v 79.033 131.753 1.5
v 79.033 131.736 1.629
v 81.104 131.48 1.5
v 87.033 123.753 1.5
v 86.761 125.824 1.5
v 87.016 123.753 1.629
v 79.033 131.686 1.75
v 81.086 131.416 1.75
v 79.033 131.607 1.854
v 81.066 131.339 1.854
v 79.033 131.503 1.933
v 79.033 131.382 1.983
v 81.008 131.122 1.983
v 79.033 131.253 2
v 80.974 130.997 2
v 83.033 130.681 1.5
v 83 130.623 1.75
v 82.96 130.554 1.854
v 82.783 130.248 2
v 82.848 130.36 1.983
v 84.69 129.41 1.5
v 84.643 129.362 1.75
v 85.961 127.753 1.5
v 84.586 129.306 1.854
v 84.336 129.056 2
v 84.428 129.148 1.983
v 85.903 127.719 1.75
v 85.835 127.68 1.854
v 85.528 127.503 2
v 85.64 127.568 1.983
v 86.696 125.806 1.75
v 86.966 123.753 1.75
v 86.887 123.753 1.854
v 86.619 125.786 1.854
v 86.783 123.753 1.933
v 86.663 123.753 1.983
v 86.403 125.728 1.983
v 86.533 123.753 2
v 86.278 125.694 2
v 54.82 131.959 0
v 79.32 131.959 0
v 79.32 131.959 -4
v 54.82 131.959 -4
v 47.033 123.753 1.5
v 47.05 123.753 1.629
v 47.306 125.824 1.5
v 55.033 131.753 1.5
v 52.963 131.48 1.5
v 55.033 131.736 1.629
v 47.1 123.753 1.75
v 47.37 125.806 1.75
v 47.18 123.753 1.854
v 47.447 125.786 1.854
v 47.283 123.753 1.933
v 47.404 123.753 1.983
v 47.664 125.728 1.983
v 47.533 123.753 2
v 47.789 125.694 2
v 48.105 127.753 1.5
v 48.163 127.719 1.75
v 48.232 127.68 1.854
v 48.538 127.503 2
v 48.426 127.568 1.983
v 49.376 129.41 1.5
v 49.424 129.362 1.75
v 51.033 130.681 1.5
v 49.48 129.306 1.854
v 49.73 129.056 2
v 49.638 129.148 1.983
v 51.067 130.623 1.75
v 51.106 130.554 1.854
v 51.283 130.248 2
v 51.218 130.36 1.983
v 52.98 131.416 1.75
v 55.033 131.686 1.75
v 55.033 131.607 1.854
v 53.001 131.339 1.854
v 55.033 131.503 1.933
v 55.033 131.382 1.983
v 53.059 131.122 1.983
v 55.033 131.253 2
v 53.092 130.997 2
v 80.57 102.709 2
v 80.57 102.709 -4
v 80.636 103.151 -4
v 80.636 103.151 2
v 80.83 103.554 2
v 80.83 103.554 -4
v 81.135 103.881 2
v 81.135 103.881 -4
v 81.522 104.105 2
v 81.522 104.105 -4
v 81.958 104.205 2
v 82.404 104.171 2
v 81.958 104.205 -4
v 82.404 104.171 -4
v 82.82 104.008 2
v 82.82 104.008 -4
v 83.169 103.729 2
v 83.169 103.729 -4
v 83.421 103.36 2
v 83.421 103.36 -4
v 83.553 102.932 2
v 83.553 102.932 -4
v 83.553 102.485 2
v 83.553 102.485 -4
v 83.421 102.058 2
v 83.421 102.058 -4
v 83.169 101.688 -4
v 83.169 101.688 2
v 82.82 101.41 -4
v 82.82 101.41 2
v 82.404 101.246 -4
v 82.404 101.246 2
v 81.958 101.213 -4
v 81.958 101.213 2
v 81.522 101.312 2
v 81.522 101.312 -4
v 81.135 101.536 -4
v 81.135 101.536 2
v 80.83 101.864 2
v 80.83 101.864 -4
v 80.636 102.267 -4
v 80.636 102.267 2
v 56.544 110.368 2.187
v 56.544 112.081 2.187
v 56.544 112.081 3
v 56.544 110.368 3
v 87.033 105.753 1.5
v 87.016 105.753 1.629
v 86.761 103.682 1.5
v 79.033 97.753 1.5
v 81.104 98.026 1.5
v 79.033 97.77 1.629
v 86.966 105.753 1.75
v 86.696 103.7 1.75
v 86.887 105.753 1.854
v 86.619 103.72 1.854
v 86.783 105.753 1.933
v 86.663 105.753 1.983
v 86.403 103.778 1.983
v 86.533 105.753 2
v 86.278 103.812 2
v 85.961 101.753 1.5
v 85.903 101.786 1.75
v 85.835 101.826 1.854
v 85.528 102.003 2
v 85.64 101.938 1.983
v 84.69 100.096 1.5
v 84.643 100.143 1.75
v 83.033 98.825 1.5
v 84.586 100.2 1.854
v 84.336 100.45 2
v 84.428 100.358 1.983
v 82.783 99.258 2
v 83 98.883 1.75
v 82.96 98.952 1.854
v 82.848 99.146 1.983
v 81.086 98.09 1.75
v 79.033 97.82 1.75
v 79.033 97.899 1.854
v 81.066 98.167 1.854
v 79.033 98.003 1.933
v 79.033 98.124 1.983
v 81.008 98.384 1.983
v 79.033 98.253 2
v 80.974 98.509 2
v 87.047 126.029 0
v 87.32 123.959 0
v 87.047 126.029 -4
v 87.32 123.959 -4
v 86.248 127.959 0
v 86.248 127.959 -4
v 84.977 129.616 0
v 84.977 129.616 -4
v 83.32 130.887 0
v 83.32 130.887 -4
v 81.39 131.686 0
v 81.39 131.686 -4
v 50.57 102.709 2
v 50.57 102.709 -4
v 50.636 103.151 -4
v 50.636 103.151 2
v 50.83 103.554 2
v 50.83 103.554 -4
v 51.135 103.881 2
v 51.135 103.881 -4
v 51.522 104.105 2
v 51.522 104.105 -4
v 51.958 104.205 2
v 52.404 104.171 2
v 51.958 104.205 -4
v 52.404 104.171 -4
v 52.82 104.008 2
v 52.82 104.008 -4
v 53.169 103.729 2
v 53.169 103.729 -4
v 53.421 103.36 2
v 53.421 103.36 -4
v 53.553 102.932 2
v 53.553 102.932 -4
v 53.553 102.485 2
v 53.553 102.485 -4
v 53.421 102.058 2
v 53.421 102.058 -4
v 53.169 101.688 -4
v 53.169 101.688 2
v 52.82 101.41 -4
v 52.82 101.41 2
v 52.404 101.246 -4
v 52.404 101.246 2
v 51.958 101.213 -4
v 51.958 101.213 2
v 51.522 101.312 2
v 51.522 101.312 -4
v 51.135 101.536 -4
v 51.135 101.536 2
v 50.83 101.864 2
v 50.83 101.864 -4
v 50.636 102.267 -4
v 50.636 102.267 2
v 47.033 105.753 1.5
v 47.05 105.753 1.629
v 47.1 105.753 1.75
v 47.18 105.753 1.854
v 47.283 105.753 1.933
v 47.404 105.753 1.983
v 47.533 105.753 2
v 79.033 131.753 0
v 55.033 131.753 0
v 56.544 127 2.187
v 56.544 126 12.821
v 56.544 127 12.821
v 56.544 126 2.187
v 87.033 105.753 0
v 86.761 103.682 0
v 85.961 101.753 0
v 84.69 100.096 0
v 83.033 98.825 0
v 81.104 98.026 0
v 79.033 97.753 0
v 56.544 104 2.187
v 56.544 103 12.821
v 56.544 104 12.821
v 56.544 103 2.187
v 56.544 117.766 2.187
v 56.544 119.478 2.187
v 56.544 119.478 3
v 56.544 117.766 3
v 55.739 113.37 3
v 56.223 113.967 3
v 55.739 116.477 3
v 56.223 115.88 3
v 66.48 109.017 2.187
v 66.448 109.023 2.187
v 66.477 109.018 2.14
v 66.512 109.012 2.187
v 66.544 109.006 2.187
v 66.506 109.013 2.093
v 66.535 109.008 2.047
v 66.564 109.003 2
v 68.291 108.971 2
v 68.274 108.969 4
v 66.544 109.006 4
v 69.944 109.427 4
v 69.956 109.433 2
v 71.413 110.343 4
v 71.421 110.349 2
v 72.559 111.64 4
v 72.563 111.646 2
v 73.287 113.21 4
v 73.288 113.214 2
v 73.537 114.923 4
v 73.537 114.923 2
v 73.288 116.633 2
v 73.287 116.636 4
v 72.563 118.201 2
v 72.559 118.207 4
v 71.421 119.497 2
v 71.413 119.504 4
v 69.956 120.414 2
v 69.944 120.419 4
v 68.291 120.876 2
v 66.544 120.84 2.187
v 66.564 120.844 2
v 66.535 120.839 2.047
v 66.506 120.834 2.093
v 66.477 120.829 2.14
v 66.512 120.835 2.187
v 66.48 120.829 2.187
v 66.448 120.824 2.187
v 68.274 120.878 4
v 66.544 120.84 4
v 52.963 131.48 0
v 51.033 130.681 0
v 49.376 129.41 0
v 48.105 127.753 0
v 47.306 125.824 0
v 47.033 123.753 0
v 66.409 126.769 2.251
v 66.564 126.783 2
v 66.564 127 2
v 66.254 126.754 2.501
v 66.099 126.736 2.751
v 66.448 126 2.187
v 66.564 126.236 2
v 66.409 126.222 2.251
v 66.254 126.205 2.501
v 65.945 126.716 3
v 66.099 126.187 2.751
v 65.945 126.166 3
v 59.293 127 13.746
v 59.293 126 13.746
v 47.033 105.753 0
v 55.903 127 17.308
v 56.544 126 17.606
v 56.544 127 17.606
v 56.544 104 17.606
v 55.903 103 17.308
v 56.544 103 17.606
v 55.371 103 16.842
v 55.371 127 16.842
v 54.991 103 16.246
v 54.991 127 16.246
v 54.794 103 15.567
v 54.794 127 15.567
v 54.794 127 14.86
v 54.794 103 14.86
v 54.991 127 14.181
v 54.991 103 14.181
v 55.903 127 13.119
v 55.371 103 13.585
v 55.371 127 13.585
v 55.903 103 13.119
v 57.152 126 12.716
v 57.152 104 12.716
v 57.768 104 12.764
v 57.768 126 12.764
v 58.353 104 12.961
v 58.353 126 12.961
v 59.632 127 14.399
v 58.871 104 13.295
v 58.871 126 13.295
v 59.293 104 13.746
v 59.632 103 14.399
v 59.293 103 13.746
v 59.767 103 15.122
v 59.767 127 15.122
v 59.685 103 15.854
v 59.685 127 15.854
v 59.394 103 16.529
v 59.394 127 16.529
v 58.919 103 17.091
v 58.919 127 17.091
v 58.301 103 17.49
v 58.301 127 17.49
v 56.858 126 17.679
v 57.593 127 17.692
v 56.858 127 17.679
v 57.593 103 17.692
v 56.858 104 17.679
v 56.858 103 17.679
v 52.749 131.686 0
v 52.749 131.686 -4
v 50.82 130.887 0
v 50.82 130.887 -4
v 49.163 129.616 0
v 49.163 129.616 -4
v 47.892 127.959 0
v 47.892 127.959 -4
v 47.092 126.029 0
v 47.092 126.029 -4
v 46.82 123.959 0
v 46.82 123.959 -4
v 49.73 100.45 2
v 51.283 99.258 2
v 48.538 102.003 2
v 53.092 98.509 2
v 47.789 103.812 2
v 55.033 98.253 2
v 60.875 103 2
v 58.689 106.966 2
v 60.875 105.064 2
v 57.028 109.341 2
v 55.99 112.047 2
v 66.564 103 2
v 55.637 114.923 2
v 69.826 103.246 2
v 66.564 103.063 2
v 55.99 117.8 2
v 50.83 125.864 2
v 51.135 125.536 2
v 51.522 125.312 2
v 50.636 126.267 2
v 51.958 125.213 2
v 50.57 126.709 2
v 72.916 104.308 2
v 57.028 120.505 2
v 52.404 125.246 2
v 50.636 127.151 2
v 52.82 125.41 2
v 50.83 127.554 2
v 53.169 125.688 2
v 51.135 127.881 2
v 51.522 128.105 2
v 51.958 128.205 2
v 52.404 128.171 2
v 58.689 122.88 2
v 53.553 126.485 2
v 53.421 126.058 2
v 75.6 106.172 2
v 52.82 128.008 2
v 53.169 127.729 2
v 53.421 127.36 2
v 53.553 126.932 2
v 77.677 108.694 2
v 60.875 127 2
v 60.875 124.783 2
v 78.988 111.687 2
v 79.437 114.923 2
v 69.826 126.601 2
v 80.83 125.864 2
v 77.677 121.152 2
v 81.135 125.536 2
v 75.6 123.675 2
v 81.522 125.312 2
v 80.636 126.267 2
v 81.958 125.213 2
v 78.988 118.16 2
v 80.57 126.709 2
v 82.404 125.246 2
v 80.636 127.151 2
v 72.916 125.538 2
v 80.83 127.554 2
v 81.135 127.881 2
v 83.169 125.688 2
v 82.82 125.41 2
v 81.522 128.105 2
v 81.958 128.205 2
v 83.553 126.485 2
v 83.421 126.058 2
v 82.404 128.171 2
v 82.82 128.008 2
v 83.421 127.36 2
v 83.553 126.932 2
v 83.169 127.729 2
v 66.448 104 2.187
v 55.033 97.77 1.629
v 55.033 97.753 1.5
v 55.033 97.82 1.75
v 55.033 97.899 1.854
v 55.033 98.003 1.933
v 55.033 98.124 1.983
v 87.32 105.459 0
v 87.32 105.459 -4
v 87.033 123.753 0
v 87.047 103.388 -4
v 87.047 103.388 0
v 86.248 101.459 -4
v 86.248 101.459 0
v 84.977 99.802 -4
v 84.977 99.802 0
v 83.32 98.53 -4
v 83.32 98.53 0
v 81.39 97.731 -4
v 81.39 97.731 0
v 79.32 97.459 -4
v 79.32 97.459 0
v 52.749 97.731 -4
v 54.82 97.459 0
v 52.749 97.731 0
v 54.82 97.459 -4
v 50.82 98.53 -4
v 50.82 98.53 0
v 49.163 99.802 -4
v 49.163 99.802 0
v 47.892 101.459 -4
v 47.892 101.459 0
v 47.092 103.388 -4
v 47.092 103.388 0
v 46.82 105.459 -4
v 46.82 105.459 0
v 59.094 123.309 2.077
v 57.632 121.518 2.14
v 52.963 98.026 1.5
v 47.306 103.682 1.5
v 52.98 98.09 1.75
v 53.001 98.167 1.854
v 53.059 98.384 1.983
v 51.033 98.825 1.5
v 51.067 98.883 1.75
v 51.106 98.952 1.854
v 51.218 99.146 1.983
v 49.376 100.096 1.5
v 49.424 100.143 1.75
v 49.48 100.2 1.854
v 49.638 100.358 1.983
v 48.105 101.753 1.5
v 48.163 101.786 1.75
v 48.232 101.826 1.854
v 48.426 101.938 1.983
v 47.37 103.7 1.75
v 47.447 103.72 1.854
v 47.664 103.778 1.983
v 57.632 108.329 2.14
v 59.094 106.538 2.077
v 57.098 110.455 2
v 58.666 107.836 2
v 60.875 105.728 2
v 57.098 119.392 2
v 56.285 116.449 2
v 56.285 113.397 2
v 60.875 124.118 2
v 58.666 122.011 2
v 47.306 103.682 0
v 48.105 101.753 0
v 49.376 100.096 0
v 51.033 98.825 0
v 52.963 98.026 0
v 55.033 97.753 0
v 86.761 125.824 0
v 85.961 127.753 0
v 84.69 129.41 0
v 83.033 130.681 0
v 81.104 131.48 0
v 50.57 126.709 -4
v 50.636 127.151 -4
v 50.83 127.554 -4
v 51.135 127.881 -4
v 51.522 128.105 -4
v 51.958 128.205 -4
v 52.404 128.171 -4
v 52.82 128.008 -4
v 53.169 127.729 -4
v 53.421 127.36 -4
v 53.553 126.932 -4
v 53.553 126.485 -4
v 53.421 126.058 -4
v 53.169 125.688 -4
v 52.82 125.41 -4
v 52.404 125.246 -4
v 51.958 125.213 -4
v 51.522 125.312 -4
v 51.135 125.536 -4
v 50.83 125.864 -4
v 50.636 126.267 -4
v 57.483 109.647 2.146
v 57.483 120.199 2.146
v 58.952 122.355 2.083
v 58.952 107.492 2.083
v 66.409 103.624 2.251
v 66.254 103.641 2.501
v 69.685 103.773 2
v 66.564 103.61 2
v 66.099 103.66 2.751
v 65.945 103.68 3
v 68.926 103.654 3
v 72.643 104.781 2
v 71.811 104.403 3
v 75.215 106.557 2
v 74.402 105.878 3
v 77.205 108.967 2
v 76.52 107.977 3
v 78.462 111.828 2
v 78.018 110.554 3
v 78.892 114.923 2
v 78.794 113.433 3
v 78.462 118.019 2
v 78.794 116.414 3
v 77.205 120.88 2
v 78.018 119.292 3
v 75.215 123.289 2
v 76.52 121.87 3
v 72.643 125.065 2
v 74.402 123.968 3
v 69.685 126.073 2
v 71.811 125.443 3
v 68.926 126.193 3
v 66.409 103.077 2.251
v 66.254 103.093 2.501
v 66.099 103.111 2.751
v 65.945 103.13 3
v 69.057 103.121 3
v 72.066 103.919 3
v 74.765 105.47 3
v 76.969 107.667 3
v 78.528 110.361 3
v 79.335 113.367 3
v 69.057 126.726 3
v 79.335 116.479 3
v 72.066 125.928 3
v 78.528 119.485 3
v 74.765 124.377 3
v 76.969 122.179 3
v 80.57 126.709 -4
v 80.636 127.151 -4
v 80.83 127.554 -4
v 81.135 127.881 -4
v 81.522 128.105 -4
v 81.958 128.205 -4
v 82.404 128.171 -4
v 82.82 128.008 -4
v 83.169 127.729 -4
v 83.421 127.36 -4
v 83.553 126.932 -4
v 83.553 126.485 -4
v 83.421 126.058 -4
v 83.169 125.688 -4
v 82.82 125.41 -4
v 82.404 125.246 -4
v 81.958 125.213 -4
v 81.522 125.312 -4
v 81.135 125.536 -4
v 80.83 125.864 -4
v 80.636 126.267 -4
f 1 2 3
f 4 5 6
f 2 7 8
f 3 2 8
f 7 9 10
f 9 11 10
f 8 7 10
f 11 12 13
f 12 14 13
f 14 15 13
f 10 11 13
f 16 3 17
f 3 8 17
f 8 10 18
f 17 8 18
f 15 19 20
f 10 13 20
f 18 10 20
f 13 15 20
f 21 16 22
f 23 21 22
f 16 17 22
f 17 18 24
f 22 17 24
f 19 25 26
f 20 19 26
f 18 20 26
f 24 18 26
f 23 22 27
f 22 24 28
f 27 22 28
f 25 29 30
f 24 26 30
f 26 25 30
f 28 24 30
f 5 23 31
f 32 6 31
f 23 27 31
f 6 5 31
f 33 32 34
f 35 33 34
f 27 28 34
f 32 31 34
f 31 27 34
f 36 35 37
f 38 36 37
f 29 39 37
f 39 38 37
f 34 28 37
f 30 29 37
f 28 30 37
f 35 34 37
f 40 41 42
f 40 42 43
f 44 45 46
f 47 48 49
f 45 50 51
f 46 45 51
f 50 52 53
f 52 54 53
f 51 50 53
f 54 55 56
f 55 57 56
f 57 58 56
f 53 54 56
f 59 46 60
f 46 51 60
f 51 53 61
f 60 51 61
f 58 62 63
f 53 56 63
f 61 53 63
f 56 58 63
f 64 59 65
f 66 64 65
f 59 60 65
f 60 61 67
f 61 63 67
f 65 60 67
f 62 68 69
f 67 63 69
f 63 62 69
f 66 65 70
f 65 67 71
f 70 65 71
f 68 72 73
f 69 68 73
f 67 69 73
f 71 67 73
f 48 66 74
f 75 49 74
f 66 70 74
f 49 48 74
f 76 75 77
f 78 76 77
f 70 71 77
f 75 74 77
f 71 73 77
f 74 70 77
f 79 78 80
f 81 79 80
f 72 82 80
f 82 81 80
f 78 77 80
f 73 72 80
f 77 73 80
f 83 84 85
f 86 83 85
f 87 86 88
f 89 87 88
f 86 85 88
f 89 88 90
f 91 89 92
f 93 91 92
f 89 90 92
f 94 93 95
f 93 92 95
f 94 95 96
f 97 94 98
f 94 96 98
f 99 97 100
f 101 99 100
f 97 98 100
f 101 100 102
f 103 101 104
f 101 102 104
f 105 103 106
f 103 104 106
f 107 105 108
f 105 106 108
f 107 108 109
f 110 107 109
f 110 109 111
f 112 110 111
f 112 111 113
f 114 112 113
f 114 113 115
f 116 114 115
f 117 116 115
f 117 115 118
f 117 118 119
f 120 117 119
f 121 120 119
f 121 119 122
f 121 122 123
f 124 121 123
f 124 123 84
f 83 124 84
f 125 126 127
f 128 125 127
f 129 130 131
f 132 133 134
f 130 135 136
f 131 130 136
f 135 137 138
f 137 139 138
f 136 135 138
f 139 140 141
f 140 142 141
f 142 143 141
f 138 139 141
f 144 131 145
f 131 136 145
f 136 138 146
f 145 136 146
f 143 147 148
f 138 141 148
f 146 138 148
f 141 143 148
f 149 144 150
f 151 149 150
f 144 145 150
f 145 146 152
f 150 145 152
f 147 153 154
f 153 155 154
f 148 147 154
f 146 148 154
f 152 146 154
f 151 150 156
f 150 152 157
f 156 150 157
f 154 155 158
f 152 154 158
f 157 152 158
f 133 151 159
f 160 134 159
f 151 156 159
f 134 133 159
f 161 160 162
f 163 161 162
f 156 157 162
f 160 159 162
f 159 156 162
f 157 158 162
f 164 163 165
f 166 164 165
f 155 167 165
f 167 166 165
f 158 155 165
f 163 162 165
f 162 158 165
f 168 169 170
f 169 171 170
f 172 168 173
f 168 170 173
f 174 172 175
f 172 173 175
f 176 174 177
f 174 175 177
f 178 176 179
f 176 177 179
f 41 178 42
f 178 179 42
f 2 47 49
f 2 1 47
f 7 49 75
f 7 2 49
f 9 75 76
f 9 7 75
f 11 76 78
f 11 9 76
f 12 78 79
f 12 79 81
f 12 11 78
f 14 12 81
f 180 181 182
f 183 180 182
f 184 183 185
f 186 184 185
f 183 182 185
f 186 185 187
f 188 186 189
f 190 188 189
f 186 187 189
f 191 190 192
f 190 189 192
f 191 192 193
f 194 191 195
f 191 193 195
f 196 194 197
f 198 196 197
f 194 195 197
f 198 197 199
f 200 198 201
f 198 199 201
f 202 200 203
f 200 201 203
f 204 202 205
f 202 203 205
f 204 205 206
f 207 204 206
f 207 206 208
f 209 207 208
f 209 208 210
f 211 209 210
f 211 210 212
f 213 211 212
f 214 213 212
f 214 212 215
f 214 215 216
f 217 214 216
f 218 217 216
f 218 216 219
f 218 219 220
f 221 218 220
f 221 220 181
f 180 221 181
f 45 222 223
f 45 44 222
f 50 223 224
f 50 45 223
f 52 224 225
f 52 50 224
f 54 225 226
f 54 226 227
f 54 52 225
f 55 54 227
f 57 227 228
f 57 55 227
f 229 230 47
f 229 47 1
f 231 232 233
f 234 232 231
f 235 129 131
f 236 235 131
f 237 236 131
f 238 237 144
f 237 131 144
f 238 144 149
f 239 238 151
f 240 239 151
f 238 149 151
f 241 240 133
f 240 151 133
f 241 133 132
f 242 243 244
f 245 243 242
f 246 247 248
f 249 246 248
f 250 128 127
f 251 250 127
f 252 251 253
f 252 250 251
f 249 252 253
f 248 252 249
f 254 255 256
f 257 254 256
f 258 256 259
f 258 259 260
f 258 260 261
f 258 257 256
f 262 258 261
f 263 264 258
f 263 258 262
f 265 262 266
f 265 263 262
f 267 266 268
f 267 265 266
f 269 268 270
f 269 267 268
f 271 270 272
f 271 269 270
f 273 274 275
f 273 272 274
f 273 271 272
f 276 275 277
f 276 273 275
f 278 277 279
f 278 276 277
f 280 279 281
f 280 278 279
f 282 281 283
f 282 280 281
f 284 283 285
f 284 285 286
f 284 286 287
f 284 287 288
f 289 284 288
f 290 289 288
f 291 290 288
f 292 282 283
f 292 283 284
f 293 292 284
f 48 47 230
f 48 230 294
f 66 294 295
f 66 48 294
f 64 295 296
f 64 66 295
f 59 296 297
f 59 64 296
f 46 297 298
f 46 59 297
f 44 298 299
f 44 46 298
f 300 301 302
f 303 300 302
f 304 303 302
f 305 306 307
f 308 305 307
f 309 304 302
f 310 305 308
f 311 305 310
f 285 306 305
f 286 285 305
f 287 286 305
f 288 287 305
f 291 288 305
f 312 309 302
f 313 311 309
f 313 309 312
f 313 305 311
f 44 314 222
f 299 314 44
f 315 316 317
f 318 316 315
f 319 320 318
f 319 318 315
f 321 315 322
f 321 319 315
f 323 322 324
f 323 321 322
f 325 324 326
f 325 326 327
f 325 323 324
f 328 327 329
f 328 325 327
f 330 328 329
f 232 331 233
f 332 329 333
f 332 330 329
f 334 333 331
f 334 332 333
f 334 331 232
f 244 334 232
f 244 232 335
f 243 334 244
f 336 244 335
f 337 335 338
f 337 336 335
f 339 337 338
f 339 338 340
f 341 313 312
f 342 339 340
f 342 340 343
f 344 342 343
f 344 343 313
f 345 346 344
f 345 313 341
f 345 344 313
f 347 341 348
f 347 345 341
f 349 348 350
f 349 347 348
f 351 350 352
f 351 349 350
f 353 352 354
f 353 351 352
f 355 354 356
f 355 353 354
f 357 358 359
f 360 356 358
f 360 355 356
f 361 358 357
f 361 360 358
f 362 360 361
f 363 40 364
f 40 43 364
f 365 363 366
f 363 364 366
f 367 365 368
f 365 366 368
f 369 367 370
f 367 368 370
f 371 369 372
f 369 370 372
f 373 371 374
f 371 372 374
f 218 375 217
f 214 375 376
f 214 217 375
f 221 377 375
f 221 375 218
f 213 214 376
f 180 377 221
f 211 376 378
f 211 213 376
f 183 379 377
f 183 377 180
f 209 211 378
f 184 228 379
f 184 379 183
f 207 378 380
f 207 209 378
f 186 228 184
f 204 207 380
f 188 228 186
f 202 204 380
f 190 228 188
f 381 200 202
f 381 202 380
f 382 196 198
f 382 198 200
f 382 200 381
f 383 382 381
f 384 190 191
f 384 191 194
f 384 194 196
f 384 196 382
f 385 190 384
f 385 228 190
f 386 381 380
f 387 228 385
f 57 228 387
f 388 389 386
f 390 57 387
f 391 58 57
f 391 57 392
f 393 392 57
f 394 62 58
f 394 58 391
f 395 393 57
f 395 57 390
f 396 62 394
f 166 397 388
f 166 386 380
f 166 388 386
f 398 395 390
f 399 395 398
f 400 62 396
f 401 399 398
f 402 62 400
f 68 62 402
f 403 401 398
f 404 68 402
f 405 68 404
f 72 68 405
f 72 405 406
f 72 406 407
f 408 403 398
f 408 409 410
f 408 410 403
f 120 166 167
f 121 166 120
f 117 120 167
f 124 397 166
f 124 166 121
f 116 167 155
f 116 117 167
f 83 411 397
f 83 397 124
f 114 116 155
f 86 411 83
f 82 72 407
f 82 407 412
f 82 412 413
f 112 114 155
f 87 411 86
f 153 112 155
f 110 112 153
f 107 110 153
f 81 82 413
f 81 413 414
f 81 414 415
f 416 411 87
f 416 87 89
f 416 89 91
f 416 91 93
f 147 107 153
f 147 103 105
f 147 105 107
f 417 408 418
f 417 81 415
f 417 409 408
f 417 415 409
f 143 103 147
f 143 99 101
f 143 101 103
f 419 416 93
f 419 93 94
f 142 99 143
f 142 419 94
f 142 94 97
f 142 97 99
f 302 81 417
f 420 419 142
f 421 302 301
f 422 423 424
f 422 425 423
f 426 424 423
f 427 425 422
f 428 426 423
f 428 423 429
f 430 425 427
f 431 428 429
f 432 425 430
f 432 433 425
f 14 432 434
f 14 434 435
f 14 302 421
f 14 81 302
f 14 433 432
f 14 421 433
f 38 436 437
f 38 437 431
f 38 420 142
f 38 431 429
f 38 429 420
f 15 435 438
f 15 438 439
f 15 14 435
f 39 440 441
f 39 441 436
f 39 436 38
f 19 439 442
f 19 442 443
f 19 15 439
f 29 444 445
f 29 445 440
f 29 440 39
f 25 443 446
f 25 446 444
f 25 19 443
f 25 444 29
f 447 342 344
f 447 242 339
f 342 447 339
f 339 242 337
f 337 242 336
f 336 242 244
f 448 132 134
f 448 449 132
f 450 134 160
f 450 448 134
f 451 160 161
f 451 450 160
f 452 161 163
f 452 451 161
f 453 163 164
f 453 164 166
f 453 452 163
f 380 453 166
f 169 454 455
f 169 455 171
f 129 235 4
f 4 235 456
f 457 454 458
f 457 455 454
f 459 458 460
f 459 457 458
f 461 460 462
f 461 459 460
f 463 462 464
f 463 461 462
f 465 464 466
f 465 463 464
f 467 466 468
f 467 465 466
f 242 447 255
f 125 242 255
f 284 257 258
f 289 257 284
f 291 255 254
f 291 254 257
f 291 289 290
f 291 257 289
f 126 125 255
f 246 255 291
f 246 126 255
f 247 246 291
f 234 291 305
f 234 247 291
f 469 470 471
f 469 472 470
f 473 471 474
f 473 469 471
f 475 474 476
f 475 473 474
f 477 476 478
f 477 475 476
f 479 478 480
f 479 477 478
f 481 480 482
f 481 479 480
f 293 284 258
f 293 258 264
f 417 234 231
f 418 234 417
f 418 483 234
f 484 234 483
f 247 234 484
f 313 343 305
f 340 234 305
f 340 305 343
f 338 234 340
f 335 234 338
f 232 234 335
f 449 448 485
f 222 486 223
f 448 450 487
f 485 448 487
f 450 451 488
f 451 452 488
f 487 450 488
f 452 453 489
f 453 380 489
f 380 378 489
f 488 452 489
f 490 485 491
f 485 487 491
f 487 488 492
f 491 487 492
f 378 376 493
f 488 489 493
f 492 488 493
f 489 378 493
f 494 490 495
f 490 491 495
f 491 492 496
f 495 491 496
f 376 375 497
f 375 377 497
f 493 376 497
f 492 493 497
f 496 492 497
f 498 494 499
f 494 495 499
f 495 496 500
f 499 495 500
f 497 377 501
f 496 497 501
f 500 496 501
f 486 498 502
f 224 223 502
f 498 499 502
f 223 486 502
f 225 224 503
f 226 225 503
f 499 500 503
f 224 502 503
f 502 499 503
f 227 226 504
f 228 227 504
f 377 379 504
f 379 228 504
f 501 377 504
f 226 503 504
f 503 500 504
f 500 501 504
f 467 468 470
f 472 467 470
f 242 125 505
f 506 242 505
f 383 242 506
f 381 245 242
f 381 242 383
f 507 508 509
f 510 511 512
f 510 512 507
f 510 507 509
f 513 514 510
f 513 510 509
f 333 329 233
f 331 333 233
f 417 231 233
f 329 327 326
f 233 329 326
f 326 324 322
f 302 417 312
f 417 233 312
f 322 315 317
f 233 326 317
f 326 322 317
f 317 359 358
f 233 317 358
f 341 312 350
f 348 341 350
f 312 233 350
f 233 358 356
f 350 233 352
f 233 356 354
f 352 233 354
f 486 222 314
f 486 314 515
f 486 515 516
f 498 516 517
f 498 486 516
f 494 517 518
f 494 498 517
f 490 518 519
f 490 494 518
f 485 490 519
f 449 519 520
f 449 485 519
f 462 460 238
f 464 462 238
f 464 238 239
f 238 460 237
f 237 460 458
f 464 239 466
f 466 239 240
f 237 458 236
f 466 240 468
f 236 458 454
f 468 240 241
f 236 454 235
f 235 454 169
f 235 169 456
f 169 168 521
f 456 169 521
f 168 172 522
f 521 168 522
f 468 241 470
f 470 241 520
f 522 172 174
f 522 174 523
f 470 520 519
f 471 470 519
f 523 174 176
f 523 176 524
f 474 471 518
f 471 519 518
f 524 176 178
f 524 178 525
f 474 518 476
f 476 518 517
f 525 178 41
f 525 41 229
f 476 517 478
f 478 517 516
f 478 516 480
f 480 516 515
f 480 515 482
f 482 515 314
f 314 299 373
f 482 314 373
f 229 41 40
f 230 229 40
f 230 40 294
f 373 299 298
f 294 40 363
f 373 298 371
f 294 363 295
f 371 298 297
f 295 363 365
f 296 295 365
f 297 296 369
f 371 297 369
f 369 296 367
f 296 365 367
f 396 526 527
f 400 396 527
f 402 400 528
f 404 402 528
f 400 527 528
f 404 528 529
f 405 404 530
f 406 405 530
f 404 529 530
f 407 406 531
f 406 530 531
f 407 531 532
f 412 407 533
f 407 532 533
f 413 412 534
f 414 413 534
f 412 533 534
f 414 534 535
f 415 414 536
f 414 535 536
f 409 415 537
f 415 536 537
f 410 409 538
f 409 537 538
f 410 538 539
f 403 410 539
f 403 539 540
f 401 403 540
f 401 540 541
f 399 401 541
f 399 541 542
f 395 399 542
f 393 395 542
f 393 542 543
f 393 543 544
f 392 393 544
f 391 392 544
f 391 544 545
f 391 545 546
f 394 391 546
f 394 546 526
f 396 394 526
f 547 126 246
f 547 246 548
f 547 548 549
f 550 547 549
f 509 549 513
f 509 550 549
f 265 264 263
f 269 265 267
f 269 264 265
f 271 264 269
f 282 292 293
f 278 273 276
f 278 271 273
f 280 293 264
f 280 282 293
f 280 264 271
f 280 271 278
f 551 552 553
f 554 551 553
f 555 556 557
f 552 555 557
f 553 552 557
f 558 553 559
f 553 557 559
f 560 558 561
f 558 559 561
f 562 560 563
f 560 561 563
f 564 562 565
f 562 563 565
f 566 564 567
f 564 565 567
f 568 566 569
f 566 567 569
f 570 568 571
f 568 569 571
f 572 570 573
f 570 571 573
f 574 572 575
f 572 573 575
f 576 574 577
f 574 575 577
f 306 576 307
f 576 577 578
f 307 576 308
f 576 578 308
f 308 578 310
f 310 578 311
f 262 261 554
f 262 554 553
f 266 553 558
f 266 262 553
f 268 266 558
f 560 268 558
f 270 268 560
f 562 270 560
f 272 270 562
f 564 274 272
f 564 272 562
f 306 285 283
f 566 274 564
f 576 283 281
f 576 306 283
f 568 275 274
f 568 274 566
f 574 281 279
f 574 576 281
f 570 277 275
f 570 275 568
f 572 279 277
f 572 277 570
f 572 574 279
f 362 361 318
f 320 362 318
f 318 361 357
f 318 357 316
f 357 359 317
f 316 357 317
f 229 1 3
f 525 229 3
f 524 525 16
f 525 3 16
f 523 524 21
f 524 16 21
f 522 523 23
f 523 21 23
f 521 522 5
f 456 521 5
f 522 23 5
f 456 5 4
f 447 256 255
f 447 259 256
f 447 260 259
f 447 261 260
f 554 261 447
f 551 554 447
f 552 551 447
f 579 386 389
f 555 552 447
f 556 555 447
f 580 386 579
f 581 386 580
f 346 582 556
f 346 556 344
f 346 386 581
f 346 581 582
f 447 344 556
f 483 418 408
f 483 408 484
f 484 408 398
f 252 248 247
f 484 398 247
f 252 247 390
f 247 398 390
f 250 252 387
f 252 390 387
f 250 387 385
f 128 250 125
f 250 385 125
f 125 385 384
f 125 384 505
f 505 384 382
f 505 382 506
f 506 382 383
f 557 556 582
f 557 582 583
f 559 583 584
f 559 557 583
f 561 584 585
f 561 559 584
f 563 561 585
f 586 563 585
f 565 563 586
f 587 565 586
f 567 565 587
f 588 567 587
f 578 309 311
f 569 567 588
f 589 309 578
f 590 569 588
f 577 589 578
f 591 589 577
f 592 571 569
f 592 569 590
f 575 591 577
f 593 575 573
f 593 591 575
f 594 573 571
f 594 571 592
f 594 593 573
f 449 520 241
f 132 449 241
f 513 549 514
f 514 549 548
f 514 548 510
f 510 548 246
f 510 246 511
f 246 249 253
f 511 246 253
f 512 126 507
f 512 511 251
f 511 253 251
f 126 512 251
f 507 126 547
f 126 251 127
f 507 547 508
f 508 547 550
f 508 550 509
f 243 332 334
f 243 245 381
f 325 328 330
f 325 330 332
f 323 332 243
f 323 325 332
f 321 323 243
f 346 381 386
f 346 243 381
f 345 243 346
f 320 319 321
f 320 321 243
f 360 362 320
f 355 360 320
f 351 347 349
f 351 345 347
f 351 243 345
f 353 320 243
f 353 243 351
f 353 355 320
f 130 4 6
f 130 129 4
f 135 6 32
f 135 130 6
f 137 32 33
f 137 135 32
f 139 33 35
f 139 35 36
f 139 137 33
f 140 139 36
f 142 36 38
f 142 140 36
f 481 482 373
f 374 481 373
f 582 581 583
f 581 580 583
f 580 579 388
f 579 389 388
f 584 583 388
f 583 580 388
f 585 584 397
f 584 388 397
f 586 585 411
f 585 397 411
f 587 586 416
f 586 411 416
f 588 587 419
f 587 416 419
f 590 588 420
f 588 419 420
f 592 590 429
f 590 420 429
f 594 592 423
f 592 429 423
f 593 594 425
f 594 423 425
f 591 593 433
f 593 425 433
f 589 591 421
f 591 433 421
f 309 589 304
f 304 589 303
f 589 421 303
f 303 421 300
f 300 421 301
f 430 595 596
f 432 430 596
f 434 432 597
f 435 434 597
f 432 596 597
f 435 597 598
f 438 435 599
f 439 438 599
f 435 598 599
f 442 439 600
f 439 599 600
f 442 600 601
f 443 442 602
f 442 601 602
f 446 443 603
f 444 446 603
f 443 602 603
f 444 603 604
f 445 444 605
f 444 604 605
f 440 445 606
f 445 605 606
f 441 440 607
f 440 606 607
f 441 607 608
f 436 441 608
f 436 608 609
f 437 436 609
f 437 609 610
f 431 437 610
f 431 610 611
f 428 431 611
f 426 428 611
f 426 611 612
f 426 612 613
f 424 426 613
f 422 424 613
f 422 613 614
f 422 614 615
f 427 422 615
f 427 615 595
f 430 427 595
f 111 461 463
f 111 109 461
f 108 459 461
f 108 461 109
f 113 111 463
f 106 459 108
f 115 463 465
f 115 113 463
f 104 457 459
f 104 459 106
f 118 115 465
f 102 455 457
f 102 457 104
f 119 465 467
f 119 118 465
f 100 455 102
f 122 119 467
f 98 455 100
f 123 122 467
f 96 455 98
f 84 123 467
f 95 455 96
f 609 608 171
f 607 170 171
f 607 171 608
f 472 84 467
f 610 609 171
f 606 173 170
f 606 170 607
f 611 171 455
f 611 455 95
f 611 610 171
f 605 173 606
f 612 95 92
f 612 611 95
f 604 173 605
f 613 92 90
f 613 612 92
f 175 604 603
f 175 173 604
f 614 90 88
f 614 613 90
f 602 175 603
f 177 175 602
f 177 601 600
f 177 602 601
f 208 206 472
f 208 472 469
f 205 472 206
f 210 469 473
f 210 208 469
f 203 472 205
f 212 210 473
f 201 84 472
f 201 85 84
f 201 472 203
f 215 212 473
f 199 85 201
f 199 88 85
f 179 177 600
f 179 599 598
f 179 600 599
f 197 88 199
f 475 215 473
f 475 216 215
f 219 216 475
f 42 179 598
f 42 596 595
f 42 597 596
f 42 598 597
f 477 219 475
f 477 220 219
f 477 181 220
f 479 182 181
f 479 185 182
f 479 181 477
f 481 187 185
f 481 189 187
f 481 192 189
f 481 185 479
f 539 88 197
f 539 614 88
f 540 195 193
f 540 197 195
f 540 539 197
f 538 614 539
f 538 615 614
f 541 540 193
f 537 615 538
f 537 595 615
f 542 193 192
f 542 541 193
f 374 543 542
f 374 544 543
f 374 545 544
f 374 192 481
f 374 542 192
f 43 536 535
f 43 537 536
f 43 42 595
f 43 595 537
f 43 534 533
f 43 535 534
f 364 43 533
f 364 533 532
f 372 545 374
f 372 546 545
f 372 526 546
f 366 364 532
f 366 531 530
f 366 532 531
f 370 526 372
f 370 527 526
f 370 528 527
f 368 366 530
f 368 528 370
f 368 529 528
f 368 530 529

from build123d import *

# Parameters (mm, degrees)
SKETCH3_W            = 40
SKETCH3_H            = 34
SKETCH3_R            = 0.25
SKETCH3_R_2          = 0.5
BOSS_EXTRUDE2_DEPTH  = 2
SKETCH4_R            = 6
BOSS_EXTRUDE3_DEPTH  = 2
SKETCH5_R            = 11.899793619
BOSS_EXTRUDE4_DEPTH  = 1
SKETCH7_R            = 11.354972543
SKETCH7_R_2          = 6
CUT_EXTRUDE1_DEPTH   = 2
BOSS_EXTRUDE5_DEPTH  = 24
SKETCH11_W           = 16
SKETCH11_H           = 22
CUT_EXTRUDE2_DEPTH   = 10
SKETCH12_R           = 2.5
BOSS_EXTRUDE6_DEPTH  = 24
CUT_EXTRUDE3_DEPTH   = 26
FILLET3_R            = 8
FILLET4_R            = 8
FILLET5_R            = 8
FILLET6_R            = 8
SKETCH16_W           = 40.5
SKETCH16_H           = 34.5
BOSS_EXTRUDE12_DEPTH = 4
SKETCH21_R           = 1.5
CUT_EXTRUDE10_DEPTH  = 8
FILLET13_R           = 0.5
FILLET15_R           = 8


with BuildPart() as part:
    # Sketch3 → Boss-Extrude2 (new body)
    with BuildSketch(Plane.XY):
        with Locations((67.033183219, 114.752969631)):
            Rectangle(SKETCH3_W, SKETCH3_H)
        with Locations((82.033183219, 126.752969631)):
            Circle(SKETCH3_R, mode=Mode.SUBTRACT)
        with Locations((52.033183219, 126.752969631)):
            Circle(SKETCH3_R_2, mode=Mode.SUBTRACT)
        with Locations((52.033183219, 102.752969631)):
            Circle(SKETCH3_R, mode=Mode.SUBTRACT)
        with Locations((82.033183219, 102.752969631)):
            Circle(SKETCH3_R_2, mode=Mode.SUBTRACT)
    extrude(amount=BOSS_EXTRUDE2_DEPTH)

    # Sketch4 → Boss-Extrude3 (add)
    with BuildSketch(Plane.XY.offset(2)):
        with Locations((67.537199027, 114.923254134)):
            Circle(SKETCH4_R)
    extrude(amount=BOSS_EXTRUDE3_DEPTH)

    # Sketch5 → Boss-Extrude4 (add)
    with BuildSketch(Plane.XY.offset(2)):
        with Locations((67.537199027, 114.923254134)):
            Circle(SKETCH5_R)
    extrude(amount=BOSS_EXTRUDE4_DEPTH)

    # Sketch7 → Cut-Extrude1 (cut)
    with BuildSketch(Plane.XY.offset(4)):
        with Locations((67.537199027, 114.923254134)):
            Circle(SKETCH7_R)
        with Locations((67.537199027, 114.923254134)):
            Circle(SKETCH7_R_2, mode=Mode.SUBTRACT)
    extrude(amount=-CUT_EXTRUDE1_DEPTH, mode=Mode.SUBTRACT)

    # Sketch10 → Boss-Extrude5 (add)
    with BuildSketch(Plane(origin=(0, 103, 0), x_dir=(1, 0, 0), z_dir=(0, 1, 0))):
        Polygon((66.720095213, -1.747898749), (56.543730993, -18.18677206), (56.543730993, -2.18677206), align=None)
    extrude(amount=BOSS_EXTRUDE5_DEPTH)

    # Sketch11 → Cut-Extrude2 (cut)
    with BuildSketch(Plane.ZY.offset(-56.543730993)):
        with Locations((10.18677206, 115)):
            Rectangle(SKETCH11_W, SKETCH11_H)
    extrude(amount=-CUT_EXTRUDE2_DEPTH, mode=Mode.SUBTRACT)

    # Sketch12 → Boss-Extrude6 (add)
    with BuildSketch(Plane.XZ.offset(-103)):
        with Locations((57.268401618, 15.213410807)):
            Circle(SKETCH12_R)
    extrude(amount=-BOSS_EXTRUDE6_DEPTH)

    # Sketch14 → Cut-Extrude3 (cut)
    with BuildSketch(Plane(origin=(0, 127, 0), x_dir=(1, 0, 0), z_dir=(0, 1, 0))):
        Polygon((56.543730993, -17.606077203), (56.543730993, -18.18677206), (56.857779916, -17.679458215), align=None)
    extrude(amount=-CUT_EXTRUDE3_DEPTH, mode=Mode.SUBTRACT)

    # Fillet3
    fillet3_edges = [part.edges().sort_by_distance(p)[0] for p in [
        (87.033183219, 131.752969631, 1),
    ]]
    fillet(fillet3_edges, radius=FILLET3_R)

    # Fillet4
    fillet4_edges = [part.edges().sort_by_distance(p)[0] for p in [
        (87.033183219, 97.752969631, 1),
    ]]
    fillet(fillet4_edges, radius=FILLET4_R)

    # Fillet5
    fillet5_edges = [part.edges().sort_by_distance(p)[0] for p in [
        (47.033183219, 131.752969631, 1),
    ]]
    fillet(fillet5_edges, radius=FILLET5_R)

    # Fillet6
    fillet6_edges = [part.edges().sort_by_distance(p)[0] for p in [
        (47.033183219, 97.752969631, 1),
    ]]
    fillet(fillet6_edges, radius=FILLET6_R)

    # Sketch16 → Boss-Extrude12 (add)
    with BuildSketch(Plane(origin=(0, 0, 0), x_dir=(-1, 0, 0), z_dir=(0, 0, -1))):
        with Locations((-67.069775125, 114.708699914)):
            Rectangle(SKETCH16_W, SKETCH16_H)
    extrude(amount=BOSS_EXTRUDE12_DEPTH)

    # Sketch21 → Cut-Extrude10 (cut)
    with BuildSketch(Plane(origin=(0, 0, -4), x_dir=(-1, 0, 0), z_dir=(0, 0, -1))):
        with Locations((-82.069775125, 126.708699914)):
            Circle(SKETCH21_R)
        with Locations((-52.069775125, 126.708699914)):
            Circle(SKETCH21_R)
        with Locations((-52.069775125, 102.708699914)):
            Circle(SKETCH21_R)
        with Locations((-82.069775125, 102.708699914)):
            Circle(SKETCH21_R)
    extrude(amount=-CUT_EXTRUDE10_DEPTH, mode=Mode.SUBTRACT)

    # Fillet13
    fillet13_edges = [part.edges().sort_by_distance(p)[0] for p in [
        (67.033183219, 131.752969631, 2),
        (84.690037469, 129.409823881, 2),
        (87.033183219, 114.752969631, 2),
        (84.690037469, 100.096115382, 2),
        (47.033183219, 114.752969631, 2),
        (49.37632897, 129.409823881, 2),
        (67.033183219, 97.752969631, 2),
        (49.37632897, 100.096115382, 2),
    ]]
    fillet(fillet13_edges, radius=FILLET13_R)

    # Fillet15
    fillet15_edges = [part.edges().sort_by_distance(p)[0] for p in [
        (87.319775125, 131.958699914, -2),
        (87.319775125, 97.458699914, -2),
        (46.819775125, 97.458699914, -2),
        (46.819775125, 131.958699914, -2),
    ]]
    fillet(fillet15_edges, radius=FILLET15_R)


solid = part.part
